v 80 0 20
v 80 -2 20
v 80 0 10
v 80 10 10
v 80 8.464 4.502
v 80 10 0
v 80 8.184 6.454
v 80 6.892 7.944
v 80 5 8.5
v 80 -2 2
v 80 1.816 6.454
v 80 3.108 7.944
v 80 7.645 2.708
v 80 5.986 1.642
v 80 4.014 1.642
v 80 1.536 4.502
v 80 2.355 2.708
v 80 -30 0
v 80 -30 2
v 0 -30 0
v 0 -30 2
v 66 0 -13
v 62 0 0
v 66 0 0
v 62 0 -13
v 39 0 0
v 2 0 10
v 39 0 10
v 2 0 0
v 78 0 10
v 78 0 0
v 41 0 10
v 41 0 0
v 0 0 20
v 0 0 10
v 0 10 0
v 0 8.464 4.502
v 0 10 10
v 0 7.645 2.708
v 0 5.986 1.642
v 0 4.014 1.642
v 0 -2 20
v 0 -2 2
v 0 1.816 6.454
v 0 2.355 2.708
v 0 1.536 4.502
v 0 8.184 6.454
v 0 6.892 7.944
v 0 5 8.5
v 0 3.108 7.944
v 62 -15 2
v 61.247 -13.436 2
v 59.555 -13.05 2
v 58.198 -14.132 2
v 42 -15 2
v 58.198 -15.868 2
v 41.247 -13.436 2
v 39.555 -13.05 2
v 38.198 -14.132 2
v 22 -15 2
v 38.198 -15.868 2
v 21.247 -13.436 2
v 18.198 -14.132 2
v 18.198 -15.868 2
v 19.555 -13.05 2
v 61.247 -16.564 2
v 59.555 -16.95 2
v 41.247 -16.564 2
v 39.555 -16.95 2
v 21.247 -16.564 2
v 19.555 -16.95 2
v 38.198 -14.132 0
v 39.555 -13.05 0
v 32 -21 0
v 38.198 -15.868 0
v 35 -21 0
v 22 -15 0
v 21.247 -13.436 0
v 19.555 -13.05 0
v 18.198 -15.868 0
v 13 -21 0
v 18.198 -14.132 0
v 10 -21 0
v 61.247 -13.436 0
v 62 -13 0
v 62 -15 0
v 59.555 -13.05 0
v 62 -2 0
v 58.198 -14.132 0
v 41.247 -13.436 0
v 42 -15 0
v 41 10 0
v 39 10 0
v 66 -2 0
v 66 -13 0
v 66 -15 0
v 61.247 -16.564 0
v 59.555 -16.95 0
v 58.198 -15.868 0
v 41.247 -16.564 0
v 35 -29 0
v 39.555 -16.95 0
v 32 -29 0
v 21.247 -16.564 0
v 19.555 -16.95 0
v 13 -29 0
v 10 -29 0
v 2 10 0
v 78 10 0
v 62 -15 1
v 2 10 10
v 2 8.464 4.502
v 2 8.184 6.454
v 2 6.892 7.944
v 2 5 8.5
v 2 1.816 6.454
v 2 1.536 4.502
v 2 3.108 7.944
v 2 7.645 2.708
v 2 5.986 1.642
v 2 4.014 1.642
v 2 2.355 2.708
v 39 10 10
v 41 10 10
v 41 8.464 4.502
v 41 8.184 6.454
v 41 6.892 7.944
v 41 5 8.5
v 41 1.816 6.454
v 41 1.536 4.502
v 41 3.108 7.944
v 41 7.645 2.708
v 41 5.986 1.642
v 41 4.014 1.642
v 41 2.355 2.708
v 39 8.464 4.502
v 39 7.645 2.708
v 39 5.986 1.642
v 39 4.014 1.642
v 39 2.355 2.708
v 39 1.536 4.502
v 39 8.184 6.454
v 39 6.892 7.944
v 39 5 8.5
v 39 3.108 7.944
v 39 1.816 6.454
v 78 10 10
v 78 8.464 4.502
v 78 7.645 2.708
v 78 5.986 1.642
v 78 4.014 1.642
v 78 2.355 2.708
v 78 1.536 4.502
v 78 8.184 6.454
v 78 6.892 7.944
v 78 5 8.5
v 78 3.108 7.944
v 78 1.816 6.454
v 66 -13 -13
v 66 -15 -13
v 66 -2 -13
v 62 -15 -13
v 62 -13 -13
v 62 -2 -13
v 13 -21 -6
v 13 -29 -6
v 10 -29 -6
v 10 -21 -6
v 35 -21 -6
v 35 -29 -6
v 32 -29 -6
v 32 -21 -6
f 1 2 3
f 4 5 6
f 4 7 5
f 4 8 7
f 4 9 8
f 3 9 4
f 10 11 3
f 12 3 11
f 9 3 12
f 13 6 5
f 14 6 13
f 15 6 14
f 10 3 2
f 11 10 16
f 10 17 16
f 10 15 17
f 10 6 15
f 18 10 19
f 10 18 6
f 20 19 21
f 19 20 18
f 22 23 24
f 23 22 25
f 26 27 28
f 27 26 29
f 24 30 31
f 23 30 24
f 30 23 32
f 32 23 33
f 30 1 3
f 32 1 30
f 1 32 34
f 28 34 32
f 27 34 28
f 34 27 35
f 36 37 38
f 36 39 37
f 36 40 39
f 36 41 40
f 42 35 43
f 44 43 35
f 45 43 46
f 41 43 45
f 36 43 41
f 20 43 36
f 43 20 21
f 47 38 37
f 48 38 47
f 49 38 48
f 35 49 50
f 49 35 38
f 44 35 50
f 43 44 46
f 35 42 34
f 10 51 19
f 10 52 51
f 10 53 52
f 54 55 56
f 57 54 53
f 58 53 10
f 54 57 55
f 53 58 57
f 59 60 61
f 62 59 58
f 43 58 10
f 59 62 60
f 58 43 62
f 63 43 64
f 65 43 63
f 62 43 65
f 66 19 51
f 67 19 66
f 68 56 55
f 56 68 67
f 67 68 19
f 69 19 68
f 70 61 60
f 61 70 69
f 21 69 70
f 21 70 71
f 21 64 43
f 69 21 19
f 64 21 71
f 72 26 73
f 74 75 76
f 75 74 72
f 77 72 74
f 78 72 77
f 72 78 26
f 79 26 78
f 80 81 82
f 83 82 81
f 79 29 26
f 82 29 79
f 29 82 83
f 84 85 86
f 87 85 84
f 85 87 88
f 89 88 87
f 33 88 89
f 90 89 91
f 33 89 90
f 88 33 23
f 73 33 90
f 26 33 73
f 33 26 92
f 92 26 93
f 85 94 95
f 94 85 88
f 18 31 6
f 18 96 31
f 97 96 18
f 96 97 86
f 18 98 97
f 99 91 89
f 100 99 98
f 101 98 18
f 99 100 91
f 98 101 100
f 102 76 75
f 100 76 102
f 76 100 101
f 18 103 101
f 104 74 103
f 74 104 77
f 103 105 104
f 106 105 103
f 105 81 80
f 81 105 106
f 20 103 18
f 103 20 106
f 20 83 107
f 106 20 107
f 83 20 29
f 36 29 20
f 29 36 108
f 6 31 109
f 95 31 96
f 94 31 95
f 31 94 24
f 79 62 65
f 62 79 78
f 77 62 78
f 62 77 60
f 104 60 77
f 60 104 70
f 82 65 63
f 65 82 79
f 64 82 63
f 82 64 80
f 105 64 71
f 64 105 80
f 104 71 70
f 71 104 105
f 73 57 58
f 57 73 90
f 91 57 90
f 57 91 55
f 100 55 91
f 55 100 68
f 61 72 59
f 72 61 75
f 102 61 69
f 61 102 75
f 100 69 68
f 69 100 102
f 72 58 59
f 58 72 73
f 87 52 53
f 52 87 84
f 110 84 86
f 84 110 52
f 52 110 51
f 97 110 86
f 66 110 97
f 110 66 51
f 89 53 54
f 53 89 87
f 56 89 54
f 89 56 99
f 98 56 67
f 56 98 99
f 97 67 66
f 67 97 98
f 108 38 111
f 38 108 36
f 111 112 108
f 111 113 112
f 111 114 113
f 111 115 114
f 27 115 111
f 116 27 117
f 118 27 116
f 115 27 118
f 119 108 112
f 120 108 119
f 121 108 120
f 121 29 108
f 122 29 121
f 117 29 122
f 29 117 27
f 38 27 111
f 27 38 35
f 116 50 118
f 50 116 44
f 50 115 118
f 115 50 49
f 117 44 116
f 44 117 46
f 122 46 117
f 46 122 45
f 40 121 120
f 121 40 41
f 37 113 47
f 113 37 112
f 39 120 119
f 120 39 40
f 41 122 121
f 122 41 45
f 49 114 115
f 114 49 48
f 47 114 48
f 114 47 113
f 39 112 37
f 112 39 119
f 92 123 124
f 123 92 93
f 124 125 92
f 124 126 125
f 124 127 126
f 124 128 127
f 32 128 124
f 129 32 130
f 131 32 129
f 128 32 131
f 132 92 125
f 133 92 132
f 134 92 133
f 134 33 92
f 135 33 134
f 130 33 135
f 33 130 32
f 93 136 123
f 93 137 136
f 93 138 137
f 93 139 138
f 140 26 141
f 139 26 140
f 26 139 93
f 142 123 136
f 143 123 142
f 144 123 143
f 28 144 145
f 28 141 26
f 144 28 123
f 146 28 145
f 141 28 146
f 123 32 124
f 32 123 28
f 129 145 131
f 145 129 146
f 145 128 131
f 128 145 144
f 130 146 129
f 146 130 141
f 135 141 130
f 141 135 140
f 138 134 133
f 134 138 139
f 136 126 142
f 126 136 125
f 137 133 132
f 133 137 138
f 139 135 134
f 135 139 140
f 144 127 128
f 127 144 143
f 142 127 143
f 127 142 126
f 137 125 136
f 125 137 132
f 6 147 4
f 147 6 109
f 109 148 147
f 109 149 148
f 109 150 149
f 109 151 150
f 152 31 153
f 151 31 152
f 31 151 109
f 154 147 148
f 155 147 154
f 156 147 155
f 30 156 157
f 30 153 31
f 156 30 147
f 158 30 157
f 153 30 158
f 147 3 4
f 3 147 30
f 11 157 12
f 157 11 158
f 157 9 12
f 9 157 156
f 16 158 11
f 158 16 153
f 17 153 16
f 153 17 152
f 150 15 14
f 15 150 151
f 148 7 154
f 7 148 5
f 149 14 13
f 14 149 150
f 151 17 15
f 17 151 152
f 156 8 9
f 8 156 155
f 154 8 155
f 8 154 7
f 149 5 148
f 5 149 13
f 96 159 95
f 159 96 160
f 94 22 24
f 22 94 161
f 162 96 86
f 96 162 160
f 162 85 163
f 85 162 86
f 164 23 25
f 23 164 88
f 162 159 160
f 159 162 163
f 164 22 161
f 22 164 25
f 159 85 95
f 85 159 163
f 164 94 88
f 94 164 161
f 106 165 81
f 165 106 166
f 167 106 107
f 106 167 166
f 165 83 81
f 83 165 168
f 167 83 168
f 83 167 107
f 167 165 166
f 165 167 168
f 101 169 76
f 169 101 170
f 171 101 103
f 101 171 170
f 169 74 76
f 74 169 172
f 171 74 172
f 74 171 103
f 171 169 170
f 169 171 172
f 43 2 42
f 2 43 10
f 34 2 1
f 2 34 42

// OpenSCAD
// Kitchen Sink Light - USB battery version.

h=20;
w=30;
d=80;

t=2;


module ledhold(t)
{   
    rotate([0,90,0])
    difference() {
        cube([10,10,t]);
        //translate([5, 5, -1]) rotate([ 0,0,90]) cylinder(h=4+t,r=3);
        translate([5, 5, -1]) rotate([ 0,0,90]) cylinder(h=4+t,r=3.5);
    }
}


module baseplate(h,w,d,t) {
// plate with hole
difference() {
  cube([d,t,w]);
  translate([d/2, -2, 15/2 + 25]) rotate([ -90,0,0]) cylinder(h=4,r=1.6);

    
  //screw hole
  translate([20, -4, 15]) rotate([ -90,0,0]) cylinder(h=7,r=2);
  translate([40, -4, 15]) rotate([ -90,0,0]) cylinder(h=7,r=2);
  translate([60, -4, 15]) rotate([ -90,0,0]) cylinder(h=7,r=2);
}

// Switch guide
translate([10,-8+t,w-7-t]) cube([t+1,5+t, 8]);
translate([10+22,-8+t,w-7-t]) cube([t+1,5+t, 8]);

// LEDtube hold
translate([0,0,0]) ledhold(t);
translate([(d-t)/2,0,0]) ledhold(t);
translate([d-t,0,0]) ledhold(t);

// DC-jack hold
translate([d-t-16,-13,0]) 
    difference() {
        cube([4,12+t, 15]);
        //translate([-2,2,2]) cube([6, 11, 11]);
        translate([-2,-1,2]) cube([7, 14, 11]);
    }
}


module sinklight(h,w,d,t) {
  cube([d,h,t]);
  translate([0,0,0]) baseplate(h,w,d,t);
}



rotate([90,0,0])  sinklight(h,w,d,t);
//rotate([90,0,180])  sinklight(h,w,d,t);
